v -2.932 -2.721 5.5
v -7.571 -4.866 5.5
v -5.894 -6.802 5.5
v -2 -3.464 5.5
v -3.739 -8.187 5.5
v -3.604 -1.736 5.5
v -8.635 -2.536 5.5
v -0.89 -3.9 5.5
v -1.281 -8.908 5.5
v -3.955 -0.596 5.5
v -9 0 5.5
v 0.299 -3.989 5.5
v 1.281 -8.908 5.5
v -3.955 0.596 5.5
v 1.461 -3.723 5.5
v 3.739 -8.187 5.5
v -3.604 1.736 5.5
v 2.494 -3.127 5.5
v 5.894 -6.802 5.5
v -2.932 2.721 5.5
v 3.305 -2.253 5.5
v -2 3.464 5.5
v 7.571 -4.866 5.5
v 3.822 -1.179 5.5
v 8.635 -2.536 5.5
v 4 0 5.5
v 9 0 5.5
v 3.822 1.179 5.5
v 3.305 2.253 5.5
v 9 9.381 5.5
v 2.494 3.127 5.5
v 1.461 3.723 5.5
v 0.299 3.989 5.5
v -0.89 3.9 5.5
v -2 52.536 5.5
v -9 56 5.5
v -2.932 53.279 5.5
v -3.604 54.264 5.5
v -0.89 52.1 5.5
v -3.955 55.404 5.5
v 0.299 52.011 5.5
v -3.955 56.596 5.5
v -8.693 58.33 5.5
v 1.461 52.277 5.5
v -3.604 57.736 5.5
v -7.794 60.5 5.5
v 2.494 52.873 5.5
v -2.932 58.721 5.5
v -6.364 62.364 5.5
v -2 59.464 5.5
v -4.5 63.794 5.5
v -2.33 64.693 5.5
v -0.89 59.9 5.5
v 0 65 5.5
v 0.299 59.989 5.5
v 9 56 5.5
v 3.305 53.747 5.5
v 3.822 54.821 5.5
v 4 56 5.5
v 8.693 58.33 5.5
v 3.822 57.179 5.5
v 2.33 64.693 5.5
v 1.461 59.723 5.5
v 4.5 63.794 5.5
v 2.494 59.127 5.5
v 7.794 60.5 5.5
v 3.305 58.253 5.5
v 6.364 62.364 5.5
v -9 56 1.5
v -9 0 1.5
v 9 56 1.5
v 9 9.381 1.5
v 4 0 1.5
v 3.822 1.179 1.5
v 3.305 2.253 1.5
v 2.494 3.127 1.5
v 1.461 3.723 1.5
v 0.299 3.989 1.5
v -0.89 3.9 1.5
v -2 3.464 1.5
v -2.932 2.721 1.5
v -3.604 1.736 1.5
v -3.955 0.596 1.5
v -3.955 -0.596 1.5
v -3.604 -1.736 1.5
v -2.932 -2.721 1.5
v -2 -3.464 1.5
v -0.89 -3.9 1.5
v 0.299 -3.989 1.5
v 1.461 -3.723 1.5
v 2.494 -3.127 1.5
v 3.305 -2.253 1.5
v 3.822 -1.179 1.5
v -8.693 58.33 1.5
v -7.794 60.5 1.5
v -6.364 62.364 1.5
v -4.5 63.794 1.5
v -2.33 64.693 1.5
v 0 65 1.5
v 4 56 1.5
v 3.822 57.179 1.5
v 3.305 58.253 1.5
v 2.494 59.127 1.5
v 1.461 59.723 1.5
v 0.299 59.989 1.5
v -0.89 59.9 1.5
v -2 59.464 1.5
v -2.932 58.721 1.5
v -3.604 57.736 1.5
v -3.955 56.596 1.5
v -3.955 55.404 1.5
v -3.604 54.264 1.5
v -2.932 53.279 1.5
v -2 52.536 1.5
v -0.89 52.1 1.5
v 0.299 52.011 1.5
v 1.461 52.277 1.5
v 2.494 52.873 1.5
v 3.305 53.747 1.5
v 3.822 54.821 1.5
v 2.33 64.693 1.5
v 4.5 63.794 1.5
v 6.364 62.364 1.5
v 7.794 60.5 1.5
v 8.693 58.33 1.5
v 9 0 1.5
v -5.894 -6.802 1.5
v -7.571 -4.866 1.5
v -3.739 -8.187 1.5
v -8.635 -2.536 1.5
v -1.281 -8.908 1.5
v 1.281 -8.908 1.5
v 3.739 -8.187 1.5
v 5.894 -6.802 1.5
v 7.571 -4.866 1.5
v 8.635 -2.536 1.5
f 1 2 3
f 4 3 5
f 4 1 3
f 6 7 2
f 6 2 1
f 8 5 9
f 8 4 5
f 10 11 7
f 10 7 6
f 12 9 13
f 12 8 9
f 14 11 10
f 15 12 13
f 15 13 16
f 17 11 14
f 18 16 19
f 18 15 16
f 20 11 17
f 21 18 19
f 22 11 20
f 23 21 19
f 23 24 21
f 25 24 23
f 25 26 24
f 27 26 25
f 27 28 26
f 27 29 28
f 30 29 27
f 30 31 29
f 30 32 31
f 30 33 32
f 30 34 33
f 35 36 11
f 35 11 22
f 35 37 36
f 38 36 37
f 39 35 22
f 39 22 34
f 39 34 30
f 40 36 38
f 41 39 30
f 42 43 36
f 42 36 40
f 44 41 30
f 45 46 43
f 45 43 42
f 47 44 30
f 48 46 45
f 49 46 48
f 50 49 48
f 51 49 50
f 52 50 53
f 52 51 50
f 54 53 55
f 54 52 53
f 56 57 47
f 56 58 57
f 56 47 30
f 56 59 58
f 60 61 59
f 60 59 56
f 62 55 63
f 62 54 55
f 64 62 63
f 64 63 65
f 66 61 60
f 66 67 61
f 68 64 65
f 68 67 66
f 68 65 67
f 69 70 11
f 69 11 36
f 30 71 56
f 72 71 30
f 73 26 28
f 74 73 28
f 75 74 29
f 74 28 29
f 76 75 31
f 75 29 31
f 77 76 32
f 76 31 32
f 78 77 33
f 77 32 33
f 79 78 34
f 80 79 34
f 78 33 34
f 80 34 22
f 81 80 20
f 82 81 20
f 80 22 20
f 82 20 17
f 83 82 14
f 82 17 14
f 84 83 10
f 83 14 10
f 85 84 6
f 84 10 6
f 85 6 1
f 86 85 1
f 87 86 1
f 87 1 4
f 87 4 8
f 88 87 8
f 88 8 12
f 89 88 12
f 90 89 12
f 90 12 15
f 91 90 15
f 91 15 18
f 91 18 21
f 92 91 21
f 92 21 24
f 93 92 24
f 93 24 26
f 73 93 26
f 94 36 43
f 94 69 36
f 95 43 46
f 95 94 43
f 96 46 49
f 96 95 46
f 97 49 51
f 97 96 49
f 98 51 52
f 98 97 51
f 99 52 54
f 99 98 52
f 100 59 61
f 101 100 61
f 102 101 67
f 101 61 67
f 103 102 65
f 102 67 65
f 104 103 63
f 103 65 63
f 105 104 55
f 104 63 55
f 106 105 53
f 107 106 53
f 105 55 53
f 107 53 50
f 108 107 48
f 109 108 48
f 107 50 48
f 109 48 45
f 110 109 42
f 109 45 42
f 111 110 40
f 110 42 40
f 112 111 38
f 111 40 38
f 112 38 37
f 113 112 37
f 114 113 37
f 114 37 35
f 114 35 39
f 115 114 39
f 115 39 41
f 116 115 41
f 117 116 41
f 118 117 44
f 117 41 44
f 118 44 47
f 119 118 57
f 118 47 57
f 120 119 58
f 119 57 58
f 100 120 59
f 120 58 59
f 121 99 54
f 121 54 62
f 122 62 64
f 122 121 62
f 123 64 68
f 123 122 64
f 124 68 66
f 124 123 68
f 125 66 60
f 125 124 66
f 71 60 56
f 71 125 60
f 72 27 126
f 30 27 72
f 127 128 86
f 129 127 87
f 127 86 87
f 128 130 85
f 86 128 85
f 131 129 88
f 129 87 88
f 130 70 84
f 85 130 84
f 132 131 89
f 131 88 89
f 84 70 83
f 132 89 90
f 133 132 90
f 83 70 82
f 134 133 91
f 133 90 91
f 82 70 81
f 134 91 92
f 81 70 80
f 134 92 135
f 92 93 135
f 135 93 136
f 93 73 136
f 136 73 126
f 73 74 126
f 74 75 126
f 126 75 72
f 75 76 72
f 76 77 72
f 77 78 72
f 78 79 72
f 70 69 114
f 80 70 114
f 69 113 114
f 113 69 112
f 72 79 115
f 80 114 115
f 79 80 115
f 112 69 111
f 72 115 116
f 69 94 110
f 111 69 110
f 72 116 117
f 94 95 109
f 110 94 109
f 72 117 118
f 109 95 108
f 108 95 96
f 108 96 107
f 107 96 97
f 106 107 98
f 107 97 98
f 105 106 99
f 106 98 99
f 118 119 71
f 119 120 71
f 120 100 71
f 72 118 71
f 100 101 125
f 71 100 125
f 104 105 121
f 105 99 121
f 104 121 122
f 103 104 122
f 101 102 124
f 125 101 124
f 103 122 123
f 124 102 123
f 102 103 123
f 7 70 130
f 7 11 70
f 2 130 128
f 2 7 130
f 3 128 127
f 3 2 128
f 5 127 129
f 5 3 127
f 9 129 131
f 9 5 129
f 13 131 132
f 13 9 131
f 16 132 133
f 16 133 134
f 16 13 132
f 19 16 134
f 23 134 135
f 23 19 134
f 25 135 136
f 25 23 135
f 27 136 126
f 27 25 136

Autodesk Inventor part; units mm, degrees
ref_plane "YZ Plane" through (0, 0, 0) normal (1, 0, 0) x (0, 1, 0)
ref_plane "XZ Plane" through (0, 0, 0) normal (0, 1, 0) x (-1, 0, 0)
ref_plane "Work Plane1" through (0, 0, 3.5) normal (0, 0, 1) x (1, 0, 0)
sketch "Sketch2" plane through (0, 0, 3.5) normal (0, 0, 1) x (1, 0, 0)
  circle A0 centre (0, 0) radius 13 projected
  line L0 (13, 0) -> (-13, 0)
  line L1 (-13, 0) -> (-13, 65)
  line L2 (-13, 65) -> (13, 65)
  line L3 (13, 65) -> (13, 0)
  line L4 (9, 0) -> (-9, 0)
  line L5 (-9, 0) -> (-9, 65)
  line L6 (-9, 65) -> (9, 65)
  line L7 (9, 65) -> (9, 0)
  point P0 (9, 9.3808)
  point P1 (9, 65)
  point P2 (-9, 9.3808)
  dimension "d5" = 65
  dimension "d15" = 18
extrude "Extrusion2" add sketch "Sketch2" along normal blind 2 and the other way blind 2 contours L5 L2 L7 A0
fillet "Fillet1" radius 9 2 edges at (9, 65, 3.5) (-9, 65, 3.5)
sketch "Sketch3" plane through (0, 0, 5.5) normal (0, 0, 1) x (1, 0, 0)
  circle A0 centre (0, 56) radius 4
  arc A1 (9, 56) -> (-9, 56) centre (0, 56) ccw projected
  point P0 (0, 0)
  dimension "d11" = 8
  dimension "d17" = 0
extrude "Extrusion3" cut sketch "Sketch3" against normal up to surface (4 mm away)
sketch "Sketch4" plane through (0, 0, 5.5) normal (0, 0, 1) x (1, 0, 0)
  circle A0 centre (0, 0) radius 11 projected
  circle A1 centre (0, 0) radius 4
  circle A2 centre (0, 0) radius 9
  line L0 (9, 9.3808) -> (9, 56) projected
  line L1 (9, 0) -> (9, 9.3808)
  line L2 (-9, 0) -> (-9, 9.8723)
  line L3 (-9, 56) -> (-9, 9.3808) projected
  line L4 (9, 9.3808) -> (4, 16.3545)
  line L5 (4, 16.3545) -> (-2.5597, 14.9818)
  line L6 (-2.5597, 14.9818) -> (-9, 9.8723)
  dimension "d18" = 8
  dimension "d19" = 18
extrude "Extrusion4" add sketch "Sketch4" against normal blind 4 contours L1 A2 L2 A0 | A0 L2 L6 L5 L4 L1 | A2 picked at (7.6596, 6.8574)
properties part number "zawieszenie ramie"
